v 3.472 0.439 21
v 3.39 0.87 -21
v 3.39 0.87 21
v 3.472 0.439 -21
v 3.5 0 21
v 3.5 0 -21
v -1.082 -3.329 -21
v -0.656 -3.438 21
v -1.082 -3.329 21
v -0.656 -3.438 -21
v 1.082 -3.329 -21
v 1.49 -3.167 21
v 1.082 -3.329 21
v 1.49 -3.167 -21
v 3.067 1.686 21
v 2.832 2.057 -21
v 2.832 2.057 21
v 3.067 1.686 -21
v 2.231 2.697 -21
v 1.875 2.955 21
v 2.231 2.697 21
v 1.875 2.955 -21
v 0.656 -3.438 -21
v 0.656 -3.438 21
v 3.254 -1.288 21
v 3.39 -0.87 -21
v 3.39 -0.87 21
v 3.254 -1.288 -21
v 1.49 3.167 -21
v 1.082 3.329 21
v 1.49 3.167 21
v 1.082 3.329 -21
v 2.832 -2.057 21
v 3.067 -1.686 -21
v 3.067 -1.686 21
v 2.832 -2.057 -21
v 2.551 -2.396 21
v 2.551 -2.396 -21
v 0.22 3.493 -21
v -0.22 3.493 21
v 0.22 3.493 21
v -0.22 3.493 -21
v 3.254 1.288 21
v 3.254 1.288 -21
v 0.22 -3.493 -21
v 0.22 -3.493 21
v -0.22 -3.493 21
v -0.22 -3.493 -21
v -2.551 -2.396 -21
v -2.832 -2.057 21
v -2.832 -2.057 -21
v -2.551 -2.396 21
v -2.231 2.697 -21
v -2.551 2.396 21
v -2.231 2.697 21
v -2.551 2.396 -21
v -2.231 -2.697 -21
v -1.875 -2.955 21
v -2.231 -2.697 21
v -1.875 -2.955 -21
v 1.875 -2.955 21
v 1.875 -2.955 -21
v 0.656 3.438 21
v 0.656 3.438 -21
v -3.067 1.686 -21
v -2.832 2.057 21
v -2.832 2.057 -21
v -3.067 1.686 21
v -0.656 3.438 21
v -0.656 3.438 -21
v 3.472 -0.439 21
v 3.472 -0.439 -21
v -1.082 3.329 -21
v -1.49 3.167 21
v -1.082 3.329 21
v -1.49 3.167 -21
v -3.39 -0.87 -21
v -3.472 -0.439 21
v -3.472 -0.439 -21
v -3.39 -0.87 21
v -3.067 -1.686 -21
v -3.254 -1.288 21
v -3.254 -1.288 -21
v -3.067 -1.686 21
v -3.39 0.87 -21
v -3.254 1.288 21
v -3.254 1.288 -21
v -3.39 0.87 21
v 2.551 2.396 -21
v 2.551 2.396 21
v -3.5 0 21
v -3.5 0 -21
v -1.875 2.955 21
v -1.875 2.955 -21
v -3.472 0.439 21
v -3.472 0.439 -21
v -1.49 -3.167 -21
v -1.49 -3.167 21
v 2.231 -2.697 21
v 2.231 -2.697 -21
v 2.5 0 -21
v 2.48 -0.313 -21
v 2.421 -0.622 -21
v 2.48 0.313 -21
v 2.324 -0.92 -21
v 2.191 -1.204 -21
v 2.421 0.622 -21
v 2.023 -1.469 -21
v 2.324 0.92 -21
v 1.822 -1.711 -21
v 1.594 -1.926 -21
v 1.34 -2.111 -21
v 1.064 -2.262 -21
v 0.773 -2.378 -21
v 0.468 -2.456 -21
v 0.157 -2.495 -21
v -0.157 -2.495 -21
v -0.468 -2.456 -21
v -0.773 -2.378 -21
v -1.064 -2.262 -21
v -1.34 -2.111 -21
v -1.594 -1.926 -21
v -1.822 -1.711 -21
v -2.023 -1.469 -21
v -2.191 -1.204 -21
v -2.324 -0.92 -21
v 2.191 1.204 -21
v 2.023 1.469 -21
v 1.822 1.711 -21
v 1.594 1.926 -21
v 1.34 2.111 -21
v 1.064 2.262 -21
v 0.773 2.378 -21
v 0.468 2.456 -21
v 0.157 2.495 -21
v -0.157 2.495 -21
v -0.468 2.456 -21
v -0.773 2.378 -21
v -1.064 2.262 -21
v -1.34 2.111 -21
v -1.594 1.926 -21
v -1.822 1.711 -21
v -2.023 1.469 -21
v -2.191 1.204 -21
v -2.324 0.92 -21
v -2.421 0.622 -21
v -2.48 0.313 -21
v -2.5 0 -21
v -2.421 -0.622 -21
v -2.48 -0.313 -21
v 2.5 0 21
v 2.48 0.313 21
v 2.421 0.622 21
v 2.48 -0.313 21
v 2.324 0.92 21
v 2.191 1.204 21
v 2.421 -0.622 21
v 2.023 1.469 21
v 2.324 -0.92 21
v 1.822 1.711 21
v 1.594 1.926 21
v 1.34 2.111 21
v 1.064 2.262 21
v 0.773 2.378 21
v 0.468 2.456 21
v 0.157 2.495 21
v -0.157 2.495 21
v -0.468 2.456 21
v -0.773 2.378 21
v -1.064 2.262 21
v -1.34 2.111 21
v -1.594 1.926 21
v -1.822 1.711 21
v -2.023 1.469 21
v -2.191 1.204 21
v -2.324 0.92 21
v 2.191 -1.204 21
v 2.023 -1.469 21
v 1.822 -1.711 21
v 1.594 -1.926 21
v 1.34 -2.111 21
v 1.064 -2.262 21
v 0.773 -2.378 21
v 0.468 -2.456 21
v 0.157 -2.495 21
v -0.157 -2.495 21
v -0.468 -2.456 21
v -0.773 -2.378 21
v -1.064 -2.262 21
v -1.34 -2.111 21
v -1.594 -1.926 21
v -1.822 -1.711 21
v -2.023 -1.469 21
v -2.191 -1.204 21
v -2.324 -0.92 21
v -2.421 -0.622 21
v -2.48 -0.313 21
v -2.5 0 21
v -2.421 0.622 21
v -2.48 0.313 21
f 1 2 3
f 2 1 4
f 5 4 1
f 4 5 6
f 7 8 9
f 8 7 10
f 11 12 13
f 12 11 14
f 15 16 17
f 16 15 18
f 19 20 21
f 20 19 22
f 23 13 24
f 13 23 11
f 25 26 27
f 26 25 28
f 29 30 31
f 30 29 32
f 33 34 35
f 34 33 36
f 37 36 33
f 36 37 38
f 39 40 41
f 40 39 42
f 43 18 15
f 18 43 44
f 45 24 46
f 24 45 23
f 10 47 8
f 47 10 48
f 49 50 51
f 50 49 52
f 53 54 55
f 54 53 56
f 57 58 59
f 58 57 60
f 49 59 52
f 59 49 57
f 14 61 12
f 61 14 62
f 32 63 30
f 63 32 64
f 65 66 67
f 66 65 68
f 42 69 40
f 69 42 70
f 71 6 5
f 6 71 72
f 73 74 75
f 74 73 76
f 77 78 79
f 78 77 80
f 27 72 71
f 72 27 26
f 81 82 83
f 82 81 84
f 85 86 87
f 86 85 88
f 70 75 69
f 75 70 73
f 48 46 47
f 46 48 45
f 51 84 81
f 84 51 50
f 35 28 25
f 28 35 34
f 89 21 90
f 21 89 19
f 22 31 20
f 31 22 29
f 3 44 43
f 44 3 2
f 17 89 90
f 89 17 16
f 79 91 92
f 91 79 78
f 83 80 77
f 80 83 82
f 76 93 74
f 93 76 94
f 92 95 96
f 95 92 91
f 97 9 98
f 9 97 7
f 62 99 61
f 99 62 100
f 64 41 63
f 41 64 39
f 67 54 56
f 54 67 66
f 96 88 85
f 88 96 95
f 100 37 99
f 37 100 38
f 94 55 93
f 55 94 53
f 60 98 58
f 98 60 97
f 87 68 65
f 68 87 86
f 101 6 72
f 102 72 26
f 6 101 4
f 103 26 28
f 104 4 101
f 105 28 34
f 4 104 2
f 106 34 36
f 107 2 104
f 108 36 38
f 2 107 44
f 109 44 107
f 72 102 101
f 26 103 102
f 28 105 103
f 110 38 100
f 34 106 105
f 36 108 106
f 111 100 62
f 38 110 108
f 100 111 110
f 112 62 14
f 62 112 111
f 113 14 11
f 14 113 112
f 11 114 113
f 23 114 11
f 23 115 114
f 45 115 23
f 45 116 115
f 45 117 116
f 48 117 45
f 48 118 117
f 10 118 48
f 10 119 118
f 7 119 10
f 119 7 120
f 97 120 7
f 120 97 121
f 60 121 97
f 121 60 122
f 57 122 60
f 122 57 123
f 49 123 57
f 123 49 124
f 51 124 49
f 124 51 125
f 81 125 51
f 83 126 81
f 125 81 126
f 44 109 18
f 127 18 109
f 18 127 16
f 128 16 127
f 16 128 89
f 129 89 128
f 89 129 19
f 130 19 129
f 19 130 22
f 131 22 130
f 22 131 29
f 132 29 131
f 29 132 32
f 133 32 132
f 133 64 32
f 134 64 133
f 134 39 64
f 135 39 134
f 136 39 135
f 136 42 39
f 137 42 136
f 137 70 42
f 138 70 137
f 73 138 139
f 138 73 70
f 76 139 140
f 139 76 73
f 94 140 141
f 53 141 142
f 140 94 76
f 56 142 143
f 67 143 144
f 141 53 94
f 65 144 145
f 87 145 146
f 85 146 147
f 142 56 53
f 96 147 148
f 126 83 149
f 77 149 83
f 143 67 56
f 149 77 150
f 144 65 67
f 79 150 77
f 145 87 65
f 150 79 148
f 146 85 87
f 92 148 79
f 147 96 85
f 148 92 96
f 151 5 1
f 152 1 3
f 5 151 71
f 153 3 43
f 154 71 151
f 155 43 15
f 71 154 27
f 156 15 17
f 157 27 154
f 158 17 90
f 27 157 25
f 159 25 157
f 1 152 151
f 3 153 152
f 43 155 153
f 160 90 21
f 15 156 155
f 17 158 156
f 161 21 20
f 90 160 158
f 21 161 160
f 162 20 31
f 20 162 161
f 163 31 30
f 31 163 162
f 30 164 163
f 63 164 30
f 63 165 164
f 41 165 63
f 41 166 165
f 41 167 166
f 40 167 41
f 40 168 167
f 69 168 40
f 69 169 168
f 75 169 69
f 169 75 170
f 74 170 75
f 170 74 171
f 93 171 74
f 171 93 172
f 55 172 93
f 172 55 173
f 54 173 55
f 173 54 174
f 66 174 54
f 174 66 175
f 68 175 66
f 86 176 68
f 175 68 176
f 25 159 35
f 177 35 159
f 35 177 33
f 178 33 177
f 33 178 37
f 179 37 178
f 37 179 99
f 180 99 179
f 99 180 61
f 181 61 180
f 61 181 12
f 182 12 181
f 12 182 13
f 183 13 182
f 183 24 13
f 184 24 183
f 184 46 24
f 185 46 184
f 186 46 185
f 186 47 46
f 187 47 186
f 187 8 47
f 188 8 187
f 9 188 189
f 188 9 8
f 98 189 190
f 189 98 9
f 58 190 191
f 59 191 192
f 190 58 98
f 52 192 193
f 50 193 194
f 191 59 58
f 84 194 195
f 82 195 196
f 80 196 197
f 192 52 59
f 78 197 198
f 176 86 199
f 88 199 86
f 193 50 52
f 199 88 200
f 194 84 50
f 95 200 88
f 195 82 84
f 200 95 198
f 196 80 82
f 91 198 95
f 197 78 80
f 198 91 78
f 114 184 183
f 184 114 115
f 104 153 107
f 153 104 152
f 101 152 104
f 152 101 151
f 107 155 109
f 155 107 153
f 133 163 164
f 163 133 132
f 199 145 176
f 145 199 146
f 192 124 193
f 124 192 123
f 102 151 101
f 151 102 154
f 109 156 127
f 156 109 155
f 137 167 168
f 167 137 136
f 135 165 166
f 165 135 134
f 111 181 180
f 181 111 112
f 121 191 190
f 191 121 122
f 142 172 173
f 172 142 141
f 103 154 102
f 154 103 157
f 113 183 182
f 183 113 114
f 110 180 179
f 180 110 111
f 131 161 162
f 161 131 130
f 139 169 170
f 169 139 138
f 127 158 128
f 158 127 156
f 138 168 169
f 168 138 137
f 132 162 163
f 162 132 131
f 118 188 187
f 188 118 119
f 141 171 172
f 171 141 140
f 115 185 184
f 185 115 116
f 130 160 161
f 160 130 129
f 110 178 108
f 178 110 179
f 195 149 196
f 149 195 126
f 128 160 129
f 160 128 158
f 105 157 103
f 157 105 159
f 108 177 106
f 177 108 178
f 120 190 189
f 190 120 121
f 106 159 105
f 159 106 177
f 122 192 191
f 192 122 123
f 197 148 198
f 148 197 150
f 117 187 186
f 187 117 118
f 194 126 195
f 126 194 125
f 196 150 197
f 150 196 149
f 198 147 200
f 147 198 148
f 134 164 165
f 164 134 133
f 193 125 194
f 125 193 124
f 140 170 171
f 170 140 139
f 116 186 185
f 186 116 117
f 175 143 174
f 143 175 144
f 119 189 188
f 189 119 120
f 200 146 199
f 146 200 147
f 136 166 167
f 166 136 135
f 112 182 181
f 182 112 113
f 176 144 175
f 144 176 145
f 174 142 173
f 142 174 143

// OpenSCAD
$fn = 50;


difference() {
	union() {
		translate(v = [0, 0, -21.0000000000]) {
			cylinder(h = 42, r = 3.5000000000);
		}
	}
	union() {
		translate(v = [0, 0, -100.0000000000]) {
			cylinder(h = 200, r = 2.5000000000);
		}
	}
}
